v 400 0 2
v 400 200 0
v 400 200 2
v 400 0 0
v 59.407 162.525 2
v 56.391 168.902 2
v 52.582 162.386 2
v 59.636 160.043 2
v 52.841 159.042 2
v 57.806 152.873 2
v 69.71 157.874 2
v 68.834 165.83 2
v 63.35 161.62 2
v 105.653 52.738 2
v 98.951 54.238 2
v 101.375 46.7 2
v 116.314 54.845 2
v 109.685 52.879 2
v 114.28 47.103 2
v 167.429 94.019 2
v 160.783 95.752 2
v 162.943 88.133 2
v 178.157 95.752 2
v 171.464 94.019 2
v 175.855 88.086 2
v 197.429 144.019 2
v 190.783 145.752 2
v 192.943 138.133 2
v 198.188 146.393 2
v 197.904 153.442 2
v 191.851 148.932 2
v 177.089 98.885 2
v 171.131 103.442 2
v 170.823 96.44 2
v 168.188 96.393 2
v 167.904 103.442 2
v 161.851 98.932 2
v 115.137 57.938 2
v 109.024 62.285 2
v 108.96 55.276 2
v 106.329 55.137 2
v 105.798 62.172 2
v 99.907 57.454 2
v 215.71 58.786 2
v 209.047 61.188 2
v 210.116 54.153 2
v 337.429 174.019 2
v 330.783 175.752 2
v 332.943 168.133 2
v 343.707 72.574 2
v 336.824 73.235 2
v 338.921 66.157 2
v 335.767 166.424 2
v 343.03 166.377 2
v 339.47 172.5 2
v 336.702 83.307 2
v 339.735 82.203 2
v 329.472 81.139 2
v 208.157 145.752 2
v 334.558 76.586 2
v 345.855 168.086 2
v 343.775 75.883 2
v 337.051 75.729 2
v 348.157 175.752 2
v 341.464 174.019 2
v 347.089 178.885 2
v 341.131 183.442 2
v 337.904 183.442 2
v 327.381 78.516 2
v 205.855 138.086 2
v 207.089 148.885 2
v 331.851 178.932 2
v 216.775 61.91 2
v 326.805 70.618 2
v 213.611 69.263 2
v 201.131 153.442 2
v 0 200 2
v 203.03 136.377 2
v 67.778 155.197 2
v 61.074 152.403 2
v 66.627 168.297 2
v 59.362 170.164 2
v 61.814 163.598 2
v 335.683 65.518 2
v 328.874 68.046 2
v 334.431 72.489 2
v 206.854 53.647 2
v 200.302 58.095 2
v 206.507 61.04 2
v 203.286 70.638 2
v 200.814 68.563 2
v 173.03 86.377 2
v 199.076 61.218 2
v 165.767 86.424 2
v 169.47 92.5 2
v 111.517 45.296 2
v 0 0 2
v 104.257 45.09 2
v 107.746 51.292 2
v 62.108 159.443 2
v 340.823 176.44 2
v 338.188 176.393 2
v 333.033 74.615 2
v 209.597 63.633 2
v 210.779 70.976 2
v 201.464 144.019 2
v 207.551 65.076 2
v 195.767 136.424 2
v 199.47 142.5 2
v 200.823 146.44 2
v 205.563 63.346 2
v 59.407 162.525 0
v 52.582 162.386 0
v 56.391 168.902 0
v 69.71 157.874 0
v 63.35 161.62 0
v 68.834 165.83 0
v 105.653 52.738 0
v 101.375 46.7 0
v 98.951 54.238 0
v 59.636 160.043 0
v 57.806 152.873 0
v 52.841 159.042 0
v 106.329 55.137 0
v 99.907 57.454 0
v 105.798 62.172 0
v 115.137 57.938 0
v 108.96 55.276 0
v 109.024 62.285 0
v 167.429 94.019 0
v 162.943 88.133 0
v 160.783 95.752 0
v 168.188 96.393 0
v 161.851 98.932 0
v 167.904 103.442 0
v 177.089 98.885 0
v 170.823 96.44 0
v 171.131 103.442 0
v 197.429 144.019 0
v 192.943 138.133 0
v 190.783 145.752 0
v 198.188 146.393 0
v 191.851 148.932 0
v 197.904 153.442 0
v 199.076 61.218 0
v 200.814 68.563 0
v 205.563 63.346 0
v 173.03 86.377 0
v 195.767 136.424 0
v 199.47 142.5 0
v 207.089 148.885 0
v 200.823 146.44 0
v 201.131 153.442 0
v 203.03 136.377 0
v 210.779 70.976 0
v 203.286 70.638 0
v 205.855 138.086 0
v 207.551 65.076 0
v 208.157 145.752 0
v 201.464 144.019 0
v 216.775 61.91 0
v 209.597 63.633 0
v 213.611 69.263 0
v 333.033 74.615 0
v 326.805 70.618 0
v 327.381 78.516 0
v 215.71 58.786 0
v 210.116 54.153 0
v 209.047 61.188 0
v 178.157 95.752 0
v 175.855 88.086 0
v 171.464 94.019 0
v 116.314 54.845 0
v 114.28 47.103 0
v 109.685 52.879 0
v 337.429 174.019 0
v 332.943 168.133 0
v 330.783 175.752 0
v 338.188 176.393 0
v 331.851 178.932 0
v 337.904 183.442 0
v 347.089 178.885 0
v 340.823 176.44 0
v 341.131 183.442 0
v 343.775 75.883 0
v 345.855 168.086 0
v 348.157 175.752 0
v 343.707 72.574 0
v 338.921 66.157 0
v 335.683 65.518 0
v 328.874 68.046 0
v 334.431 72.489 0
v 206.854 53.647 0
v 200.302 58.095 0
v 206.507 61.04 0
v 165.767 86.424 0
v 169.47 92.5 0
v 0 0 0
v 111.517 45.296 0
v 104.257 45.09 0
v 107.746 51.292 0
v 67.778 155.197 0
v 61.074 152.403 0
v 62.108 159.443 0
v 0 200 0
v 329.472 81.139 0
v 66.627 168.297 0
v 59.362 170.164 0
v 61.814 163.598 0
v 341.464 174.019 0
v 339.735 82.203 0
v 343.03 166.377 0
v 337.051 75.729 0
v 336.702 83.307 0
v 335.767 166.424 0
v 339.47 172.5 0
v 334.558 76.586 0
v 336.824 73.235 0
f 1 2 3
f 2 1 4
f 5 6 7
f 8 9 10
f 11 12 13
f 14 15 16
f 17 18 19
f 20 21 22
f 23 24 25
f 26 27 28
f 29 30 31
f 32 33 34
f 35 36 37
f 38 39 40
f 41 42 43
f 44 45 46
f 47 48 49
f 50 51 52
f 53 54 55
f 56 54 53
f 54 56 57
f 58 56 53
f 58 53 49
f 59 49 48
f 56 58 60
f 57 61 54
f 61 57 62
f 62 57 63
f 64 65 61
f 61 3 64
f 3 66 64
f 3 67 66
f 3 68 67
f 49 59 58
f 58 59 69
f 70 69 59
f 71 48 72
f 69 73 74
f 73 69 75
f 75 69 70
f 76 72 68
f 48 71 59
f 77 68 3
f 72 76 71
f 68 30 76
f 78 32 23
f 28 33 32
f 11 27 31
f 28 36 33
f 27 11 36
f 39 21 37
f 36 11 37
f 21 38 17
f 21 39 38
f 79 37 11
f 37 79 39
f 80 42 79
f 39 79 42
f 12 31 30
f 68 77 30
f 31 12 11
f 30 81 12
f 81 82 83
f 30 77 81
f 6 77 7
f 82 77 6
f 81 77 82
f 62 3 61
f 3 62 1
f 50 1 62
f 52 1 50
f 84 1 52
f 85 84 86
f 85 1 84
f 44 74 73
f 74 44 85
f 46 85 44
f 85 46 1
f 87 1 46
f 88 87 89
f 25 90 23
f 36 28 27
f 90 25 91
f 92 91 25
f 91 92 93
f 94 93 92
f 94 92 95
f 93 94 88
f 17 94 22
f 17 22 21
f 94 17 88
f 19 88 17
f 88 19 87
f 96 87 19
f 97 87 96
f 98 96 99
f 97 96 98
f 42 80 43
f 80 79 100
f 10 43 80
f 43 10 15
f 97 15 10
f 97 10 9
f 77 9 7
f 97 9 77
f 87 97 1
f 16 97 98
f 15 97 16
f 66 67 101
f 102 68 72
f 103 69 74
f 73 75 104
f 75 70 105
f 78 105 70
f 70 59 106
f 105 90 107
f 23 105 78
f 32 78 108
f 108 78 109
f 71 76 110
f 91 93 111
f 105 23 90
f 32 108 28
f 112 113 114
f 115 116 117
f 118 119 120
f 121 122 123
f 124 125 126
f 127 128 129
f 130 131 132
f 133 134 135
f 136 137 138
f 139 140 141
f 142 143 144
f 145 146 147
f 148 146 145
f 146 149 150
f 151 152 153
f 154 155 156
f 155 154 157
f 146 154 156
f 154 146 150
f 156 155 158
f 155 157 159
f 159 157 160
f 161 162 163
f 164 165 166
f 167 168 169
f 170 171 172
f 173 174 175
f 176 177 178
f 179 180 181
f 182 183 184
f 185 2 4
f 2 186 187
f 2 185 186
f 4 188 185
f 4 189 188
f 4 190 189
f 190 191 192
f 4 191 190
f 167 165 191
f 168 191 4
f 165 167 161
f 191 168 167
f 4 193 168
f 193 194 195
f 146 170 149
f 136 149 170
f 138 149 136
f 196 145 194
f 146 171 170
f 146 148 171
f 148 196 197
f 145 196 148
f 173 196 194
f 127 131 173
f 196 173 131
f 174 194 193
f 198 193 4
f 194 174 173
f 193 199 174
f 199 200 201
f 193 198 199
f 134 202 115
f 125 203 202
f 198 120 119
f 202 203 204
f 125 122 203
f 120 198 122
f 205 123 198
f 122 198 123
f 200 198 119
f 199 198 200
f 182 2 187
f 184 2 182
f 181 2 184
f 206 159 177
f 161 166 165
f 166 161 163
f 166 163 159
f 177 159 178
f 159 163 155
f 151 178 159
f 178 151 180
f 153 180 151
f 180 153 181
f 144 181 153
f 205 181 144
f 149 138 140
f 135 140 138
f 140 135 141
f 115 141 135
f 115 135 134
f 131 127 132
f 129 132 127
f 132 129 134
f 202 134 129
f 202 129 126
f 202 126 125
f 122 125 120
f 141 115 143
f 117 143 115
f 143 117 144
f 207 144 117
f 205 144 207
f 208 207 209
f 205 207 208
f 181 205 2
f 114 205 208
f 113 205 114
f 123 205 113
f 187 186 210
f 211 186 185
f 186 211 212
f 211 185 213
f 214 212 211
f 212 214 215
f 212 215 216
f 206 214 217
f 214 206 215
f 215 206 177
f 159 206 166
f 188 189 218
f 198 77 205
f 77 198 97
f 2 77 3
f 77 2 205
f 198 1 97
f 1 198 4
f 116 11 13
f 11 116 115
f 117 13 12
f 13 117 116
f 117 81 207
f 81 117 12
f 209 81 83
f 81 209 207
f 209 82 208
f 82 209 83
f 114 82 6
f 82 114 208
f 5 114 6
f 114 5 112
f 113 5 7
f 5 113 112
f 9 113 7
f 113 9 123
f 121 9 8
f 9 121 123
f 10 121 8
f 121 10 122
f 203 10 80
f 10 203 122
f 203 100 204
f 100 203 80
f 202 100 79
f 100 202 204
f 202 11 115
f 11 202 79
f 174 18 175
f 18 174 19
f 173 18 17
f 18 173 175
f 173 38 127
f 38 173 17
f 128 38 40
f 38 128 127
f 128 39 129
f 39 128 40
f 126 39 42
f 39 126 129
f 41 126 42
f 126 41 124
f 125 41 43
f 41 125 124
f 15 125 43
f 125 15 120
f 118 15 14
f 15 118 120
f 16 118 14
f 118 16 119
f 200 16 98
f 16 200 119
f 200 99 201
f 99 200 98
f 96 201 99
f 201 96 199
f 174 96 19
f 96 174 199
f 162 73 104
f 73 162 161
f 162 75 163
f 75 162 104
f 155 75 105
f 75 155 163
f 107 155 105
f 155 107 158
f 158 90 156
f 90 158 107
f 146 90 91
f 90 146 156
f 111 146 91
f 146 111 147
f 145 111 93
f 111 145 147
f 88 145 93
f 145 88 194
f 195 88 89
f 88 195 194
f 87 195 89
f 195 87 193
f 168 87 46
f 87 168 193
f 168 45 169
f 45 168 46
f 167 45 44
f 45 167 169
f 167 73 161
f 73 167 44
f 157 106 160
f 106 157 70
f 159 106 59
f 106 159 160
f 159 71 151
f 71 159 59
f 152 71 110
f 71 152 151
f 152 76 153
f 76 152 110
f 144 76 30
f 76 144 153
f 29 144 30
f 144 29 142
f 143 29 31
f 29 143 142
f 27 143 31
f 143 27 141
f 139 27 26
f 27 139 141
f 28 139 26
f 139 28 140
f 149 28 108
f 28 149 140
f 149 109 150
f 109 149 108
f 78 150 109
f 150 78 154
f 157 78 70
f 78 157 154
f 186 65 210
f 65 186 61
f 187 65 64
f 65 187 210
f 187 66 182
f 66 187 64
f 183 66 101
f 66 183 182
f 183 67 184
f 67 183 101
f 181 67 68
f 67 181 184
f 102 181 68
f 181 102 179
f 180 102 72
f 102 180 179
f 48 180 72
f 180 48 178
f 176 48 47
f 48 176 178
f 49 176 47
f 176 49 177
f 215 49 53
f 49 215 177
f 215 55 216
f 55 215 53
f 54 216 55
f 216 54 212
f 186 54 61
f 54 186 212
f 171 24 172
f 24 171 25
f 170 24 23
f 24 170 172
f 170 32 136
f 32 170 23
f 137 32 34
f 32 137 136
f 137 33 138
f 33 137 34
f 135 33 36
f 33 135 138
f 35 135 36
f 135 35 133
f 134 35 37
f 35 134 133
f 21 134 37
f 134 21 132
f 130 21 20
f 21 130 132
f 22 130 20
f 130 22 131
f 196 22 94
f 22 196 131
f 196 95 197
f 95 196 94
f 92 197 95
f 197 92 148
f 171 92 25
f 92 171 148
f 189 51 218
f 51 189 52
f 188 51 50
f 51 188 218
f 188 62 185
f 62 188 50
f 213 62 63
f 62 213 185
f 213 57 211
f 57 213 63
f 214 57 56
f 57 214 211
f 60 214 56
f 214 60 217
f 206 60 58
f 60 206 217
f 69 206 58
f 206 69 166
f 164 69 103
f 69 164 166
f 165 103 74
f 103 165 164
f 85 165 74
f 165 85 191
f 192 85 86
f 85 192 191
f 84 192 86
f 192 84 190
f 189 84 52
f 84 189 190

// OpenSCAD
cube_x = 5;
cube_y = 20;
cube_z = 4;

module asterisk() {
    linear_extrude(4) text(text = "*", size = 35);
};



difference(){
    cube([400,200,2]);
    rotate([0,0,23]) translate([110,100,-1]) asterisk();
    rotate([0,0,2]) translate([100,25,-1]) asterisk();
    rotate([0,0,40]) translate([190,-110,-1]) asterisk();
    translate([190,120,-1]) asterisk();
    translate([330,150,-1]) asterisk();
    rotate([0,0,0]) translate([160,70,-1]) asterisk();
    rotate([0,0,-20]) translate([280,160,-1]) asterisk();
}
